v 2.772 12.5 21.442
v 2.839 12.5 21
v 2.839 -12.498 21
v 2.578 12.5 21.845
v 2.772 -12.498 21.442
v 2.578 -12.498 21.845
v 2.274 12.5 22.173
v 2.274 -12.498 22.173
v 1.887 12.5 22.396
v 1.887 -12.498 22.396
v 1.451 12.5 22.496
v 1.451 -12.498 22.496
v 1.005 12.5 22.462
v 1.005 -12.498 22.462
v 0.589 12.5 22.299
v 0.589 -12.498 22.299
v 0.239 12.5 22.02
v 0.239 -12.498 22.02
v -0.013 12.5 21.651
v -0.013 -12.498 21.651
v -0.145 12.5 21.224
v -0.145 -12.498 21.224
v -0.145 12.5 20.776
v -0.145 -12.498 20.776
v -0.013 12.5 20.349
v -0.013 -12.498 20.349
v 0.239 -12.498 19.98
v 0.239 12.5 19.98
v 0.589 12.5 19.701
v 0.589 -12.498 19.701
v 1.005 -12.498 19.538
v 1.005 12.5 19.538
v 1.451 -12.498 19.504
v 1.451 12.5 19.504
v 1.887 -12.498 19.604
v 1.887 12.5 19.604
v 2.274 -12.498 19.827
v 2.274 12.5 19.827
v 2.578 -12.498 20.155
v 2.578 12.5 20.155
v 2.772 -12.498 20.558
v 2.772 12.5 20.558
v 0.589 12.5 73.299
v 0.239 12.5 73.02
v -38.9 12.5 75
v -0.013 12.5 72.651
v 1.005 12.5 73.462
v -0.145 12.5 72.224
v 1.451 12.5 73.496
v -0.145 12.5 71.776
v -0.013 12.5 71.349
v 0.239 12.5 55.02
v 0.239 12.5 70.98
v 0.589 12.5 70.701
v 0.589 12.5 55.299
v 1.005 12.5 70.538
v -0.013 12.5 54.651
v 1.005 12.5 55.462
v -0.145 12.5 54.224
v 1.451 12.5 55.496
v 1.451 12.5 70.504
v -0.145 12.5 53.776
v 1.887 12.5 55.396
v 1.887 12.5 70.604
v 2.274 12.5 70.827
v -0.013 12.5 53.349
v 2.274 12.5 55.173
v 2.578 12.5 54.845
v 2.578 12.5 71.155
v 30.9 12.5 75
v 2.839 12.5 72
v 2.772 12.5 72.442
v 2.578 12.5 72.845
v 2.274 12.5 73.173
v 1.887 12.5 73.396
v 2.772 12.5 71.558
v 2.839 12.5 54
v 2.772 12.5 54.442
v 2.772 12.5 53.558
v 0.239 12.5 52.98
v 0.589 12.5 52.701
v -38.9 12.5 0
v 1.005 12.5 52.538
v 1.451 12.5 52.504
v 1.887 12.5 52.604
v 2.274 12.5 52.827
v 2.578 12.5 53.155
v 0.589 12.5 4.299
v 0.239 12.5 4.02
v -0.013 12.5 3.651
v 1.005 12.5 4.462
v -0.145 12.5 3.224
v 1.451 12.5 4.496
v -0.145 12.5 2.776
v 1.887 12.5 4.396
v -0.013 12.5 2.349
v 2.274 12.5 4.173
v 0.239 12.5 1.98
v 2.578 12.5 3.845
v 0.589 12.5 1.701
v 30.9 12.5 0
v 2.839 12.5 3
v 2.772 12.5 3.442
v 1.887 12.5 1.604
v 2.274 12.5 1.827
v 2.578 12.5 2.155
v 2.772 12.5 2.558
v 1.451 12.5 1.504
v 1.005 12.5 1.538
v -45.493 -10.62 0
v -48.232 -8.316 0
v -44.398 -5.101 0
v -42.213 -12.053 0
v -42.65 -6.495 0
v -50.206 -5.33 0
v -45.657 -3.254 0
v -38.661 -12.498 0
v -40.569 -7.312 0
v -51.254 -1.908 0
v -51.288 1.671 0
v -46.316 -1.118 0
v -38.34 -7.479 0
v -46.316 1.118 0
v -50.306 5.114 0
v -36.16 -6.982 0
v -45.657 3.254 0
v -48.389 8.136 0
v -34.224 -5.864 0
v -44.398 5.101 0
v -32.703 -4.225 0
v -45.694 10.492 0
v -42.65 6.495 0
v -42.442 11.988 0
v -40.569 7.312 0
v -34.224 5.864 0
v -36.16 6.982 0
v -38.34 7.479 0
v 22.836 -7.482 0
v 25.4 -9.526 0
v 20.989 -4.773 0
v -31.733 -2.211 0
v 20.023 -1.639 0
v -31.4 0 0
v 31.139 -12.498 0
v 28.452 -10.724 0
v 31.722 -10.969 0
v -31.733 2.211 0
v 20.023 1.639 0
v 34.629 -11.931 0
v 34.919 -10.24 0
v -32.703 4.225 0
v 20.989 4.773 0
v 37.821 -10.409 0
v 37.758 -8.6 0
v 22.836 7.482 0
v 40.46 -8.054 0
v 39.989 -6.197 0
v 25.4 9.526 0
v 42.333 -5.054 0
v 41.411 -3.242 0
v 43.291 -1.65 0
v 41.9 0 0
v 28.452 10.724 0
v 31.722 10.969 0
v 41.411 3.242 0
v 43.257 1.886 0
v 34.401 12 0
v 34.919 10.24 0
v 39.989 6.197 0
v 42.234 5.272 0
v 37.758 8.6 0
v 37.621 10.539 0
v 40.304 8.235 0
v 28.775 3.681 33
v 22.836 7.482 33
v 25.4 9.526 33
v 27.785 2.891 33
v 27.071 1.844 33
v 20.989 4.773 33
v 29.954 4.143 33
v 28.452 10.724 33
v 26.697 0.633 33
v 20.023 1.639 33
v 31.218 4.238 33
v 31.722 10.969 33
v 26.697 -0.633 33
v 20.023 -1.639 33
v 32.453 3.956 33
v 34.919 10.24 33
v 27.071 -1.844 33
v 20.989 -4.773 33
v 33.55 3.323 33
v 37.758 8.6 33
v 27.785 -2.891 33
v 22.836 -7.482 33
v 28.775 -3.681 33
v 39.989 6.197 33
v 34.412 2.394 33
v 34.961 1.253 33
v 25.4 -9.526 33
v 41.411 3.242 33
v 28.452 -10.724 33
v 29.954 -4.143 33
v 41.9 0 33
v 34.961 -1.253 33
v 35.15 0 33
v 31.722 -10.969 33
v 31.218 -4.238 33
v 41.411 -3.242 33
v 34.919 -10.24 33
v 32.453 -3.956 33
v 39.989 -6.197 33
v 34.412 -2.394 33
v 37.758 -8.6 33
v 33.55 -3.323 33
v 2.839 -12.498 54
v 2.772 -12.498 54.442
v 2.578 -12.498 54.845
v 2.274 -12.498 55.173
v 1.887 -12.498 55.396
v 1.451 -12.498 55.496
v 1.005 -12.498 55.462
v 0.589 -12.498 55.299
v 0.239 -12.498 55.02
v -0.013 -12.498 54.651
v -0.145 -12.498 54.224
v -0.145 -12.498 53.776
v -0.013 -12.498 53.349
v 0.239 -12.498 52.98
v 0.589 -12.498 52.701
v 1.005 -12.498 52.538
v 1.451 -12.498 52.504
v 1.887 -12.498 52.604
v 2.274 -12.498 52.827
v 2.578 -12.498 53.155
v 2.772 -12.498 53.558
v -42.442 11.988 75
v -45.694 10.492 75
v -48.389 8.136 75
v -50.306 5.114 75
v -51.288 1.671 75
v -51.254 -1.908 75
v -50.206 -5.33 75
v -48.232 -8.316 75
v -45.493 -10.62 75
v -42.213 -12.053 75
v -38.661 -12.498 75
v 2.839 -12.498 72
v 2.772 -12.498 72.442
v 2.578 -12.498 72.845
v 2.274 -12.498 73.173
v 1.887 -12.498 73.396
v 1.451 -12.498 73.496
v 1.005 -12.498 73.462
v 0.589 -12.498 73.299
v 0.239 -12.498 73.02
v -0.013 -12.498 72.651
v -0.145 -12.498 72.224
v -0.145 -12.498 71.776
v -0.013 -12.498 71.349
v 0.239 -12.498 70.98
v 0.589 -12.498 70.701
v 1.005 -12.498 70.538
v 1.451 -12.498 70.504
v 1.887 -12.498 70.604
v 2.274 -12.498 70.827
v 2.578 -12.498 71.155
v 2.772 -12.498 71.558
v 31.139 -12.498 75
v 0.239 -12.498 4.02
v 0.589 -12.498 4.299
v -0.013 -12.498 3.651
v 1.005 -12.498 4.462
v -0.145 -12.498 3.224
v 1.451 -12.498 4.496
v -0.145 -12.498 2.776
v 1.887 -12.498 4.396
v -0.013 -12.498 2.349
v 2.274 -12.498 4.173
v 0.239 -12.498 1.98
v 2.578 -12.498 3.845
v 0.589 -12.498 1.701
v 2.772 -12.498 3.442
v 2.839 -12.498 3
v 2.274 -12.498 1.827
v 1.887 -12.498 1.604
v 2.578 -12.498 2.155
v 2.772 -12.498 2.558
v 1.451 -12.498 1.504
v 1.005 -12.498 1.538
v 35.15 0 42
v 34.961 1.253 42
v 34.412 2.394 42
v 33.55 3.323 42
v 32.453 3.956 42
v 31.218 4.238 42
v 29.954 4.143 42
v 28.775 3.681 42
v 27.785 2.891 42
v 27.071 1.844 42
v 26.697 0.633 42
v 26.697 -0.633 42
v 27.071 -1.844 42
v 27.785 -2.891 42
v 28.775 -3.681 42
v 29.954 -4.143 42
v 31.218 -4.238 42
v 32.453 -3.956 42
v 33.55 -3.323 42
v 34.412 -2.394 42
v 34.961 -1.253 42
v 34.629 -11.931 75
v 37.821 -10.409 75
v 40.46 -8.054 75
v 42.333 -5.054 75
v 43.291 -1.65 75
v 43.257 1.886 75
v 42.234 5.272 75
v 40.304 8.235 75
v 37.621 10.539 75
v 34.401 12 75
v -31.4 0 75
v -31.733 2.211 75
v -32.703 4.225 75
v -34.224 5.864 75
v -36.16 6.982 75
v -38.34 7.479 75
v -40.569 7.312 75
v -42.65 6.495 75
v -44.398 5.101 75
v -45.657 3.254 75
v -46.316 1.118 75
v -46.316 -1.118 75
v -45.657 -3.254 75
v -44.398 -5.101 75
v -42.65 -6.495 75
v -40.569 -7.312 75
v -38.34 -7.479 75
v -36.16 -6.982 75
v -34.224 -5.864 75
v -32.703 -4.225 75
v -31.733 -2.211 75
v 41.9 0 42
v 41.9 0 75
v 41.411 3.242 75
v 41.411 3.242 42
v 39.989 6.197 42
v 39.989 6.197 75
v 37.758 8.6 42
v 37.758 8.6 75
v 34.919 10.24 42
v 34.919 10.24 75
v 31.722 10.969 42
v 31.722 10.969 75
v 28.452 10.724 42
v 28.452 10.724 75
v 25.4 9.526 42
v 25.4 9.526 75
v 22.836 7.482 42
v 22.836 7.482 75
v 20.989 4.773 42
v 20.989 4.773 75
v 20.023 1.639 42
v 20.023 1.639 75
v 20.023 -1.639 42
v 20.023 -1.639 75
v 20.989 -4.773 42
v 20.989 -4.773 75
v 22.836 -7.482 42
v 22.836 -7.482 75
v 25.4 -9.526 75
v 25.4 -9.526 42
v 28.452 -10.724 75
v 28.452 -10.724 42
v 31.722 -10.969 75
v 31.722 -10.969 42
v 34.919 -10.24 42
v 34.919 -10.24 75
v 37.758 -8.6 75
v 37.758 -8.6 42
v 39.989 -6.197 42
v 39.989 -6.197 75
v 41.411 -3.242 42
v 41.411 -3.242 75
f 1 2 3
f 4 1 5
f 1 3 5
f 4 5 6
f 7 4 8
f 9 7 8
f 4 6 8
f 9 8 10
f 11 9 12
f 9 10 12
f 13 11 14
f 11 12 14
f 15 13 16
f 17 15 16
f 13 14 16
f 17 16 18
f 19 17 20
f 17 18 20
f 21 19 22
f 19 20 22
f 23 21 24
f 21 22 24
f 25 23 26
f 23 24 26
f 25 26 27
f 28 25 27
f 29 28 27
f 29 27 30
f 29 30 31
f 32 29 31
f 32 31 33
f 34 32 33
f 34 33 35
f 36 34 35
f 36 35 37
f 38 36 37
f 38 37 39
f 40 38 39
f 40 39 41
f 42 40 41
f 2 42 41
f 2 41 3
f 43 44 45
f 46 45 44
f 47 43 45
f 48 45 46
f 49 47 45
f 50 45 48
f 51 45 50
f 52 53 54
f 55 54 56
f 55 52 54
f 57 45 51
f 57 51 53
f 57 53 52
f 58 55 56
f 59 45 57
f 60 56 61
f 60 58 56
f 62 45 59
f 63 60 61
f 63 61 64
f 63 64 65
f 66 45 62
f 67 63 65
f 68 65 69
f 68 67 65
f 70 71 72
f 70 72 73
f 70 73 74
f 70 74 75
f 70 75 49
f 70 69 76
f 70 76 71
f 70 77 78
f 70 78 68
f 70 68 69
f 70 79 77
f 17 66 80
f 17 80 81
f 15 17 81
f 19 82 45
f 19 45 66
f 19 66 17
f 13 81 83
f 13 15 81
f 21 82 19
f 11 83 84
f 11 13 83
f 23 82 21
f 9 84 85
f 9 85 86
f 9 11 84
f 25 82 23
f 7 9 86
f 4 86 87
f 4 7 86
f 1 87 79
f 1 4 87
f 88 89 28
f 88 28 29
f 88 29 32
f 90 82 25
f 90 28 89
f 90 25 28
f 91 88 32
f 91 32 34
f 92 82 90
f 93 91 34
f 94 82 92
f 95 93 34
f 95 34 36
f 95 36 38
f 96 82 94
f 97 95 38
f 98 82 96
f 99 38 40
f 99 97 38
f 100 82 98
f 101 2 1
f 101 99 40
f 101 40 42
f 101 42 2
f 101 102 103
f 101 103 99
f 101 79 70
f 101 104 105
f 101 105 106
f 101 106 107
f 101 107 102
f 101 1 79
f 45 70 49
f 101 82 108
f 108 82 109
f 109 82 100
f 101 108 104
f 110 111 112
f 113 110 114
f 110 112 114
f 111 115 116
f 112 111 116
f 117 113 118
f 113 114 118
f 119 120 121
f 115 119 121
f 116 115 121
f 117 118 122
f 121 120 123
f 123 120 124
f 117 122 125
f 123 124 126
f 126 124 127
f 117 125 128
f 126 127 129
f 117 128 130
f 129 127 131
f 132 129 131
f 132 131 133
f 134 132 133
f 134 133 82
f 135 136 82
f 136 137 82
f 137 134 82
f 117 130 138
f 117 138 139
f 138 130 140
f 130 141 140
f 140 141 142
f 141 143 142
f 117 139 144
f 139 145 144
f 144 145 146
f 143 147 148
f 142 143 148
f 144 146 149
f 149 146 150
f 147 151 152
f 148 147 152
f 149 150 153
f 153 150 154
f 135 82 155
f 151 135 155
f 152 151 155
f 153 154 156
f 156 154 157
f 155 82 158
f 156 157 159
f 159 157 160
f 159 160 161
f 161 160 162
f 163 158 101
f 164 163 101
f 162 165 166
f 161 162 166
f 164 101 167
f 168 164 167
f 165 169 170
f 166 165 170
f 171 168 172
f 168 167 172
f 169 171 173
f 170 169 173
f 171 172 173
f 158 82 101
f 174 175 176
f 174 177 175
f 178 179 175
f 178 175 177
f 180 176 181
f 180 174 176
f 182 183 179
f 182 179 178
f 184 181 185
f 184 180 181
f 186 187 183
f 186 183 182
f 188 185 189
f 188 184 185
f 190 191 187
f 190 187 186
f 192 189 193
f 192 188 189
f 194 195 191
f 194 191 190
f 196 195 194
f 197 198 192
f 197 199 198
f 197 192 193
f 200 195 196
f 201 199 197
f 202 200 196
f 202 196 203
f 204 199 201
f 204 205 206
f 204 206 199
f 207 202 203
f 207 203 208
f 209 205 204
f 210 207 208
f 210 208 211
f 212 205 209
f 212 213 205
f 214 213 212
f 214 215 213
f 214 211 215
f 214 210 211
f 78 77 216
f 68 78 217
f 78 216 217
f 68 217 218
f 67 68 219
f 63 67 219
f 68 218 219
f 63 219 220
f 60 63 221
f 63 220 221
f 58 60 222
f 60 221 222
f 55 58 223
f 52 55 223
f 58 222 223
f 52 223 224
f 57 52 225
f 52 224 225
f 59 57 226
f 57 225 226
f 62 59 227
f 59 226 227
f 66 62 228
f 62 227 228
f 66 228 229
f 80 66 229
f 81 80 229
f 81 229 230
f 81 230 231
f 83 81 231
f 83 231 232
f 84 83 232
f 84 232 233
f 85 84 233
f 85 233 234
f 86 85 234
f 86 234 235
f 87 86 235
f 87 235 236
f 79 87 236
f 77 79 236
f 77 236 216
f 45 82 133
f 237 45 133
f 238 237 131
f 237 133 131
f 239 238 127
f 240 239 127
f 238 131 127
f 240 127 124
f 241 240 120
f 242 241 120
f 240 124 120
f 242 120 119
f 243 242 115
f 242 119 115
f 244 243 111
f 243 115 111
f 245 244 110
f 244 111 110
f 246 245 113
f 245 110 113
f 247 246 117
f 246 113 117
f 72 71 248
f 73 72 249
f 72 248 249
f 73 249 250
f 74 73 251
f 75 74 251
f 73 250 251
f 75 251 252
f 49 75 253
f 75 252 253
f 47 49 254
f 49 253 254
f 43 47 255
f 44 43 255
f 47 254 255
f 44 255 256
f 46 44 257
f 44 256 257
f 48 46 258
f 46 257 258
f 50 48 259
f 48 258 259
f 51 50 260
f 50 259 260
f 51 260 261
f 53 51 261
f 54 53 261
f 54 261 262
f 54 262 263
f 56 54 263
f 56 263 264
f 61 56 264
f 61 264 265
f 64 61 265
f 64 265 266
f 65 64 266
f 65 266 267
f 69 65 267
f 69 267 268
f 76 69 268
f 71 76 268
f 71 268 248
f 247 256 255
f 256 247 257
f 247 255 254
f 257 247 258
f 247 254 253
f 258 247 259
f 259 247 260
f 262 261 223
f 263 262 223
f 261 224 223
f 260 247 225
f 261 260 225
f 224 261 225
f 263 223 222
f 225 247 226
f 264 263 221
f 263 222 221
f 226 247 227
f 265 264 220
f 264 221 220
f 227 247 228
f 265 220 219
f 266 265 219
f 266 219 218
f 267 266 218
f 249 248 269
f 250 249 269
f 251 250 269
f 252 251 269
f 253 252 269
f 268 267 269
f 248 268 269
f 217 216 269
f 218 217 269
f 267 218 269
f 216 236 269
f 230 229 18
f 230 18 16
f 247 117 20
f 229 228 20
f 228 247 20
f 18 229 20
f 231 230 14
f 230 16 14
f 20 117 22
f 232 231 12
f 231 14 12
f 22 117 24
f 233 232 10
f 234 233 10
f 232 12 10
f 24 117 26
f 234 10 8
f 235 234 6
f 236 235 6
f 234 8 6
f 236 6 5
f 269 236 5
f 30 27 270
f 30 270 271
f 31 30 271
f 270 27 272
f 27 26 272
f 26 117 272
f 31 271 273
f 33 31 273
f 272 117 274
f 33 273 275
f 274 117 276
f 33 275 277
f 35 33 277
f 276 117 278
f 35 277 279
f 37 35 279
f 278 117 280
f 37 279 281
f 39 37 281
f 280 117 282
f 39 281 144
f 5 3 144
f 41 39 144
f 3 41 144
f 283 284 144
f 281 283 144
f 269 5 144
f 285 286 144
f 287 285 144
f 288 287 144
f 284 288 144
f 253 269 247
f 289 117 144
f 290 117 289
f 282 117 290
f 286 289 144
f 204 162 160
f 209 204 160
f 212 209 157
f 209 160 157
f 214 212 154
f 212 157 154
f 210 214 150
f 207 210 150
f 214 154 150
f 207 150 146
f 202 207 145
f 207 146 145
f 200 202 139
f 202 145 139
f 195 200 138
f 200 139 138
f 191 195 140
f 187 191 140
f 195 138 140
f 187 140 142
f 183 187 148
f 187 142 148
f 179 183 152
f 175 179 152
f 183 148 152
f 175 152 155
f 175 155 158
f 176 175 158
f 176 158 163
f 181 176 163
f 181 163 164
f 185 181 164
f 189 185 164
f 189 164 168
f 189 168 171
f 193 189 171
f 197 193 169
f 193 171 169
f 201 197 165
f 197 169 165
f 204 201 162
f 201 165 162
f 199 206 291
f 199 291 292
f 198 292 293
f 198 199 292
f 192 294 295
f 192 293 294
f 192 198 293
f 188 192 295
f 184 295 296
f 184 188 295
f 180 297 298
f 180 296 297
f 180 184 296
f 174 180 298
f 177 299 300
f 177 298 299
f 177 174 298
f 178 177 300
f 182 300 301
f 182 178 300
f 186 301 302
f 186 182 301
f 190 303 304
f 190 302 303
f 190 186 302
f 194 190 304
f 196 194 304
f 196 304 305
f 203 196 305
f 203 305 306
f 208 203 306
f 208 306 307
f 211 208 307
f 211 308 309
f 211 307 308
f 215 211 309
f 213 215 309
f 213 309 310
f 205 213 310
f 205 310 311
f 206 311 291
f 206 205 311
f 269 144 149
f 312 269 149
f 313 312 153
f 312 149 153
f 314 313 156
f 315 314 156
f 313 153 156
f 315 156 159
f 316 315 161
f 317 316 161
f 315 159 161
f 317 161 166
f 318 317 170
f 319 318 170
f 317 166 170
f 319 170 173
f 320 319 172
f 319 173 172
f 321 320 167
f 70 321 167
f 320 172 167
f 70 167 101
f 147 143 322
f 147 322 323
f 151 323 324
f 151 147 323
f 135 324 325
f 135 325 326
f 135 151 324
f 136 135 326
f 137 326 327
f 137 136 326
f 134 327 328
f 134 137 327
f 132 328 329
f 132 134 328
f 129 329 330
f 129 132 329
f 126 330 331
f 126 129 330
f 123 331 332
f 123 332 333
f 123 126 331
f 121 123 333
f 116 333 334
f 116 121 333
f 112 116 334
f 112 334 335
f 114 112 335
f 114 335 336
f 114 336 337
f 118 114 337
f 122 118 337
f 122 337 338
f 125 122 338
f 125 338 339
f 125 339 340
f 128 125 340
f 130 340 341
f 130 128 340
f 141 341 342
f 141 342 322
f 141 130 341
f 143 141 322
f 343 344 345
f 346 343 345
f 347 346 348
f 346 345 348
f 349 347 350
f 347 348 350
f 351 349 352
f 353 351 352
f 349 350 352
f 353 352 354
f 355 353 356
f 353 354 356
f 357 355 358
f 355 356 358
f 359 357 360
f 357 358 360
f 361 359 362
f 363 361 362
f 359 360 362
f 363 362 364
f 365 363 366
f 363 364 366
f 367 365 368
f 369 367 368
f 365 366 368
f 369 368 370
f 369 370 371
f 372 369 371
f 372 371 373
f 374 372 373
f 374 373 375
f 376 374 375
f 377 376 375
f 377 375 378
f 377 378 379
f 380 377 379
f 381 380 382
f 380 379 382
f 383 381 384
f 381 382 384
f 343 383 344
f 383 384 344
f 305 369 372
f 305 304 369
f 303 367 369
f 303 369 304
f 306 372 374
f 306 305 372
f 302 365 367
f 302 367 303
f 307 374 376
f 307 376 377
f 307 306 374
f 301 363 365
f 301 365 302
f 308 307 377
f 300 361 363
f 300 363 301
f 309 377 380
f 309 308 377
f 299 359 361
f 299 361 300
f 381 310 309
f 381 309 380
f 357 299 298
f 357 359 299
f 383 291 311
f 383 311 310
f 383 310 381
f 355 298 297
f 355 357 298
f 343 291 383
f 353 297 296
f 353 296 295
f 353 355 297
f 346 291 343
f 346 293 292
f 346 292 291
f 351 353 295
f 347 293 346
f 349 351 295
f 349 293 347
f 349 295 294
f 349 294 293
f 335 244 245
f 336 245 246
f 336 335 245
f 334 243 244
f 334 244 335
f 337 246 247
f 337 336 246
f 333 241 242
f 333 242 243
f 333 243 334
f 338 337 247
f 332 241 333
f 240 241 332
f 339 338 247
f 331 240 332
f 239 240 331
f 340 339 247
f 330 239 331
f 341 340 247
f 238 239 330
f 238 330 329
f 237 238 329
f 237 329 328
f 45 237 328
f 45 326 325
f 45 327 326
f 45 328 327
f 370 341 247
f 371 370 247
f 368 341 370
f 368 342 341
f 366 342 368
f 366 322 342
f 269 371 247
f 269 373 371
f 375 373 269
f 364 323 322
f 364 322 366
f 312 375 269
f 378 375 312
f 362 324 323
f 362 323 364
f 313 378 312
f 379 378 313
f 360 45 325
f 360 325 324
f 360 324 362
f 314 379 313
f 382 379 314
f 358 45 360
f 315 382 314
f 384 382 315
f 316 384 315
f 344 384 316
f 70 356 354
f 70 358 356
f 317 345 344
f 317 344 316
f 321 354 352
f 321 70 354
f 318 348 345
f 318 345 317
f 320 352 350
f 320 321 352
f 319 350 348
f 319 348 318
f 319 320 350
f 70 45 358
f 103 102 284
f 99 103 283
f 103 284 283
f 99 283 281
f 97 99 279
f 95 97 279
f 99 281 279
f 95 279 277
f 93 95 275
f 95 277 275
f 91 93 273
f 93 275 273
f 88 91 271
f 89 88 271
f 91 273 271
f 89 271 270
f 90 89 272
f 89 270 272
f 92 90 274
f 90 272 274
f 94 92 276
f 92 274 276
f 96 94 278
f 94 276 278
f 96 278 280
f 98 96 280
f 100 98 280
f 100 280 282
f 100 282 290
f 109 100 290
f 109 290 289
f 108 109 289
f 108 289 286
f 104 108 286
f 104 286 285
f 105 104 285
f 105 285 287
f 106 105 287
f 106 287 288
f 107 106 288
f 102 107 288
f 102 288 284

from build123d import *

# Parameters (mm, degrees)
SKETCH_R        = 7.5
SKETCH_R_2      = 4.25
PAD_DEPTH       = 75
SKETCH004_R     = 1.5
HOLE001_DEPTH   = 25
HOLE001_TIPS_R  = 1.5
SKETCH005_R     = 11
POCKET002_DEPTH = 33
SKETCH006_R     = 11
POCKET003_DEPTH = 33


with BuildPart() as part:
    # Sketch → Pad (new body)
    with BuildSketch(Plane.XY):
        with BuildLine():
            ThreePointArc((-38.9, 12.5), (-51.39943, -0.119353), (-38.661306, -12.497721))
            Line((-38.661306, -12.497721), (31.138694, -12.497721))
            ThreePointArc((31.138694, -12.497721), (43.39943, 0.119353), (30.9, 12.5))
            Line((-38.9, 12.5), (30.9, 12.5))
        make_face()
        with Locations((-38.9, 0)):
            Circle(SKETCH_R, mode=Mode.SUBTRACT)
        with Locations((30.9, 0)):
            Circle(SKETCH_R_2, mode=Mode.SUBTRACT)
    extrude(amount=PAD_DEPTH)

    # Sketch004 → Hole001 (cut)
    with BuildSketch(Plane.XZ.offset(12.5)):
        with Locations((1.338694, 72)):
            Circle(SKETCH004_R)
        with Locations((1.338694, 54)):
            Circle(SKETCH004_R)
        with Locations((1.338694, 21)):
            Circle(SKETCH004_R)
        with Locations((1.338694, 3)):
            Circle(SKETCH004_R)
    extrude(amount=-HOLE001_DEPTH, mode=Mode.SUBTRACT)

    # Hole001 tips → Hole001 tip 1 section 0
    with BuildSketch(Plane.XZ.offset(-12.5), mode=Mode.PRIVATE) as hole001_tip_1_s0:
        with Locations((1.338694, 72)):
            Circle(HOLE001_TIPS_R)
    loft([hole001_tip_1_s0.sketch, Vertex(1.338694, 13.401291, 72)], mode=Mode.SUBTRACT)

    # Hole001 tips → Hole001 tip 2 section 0
    with BuildSketch(Plane.XZ.offset(-12.5), mode=Mode.PRIVATE) as hole001_tip_2_s0:
        with Locations((1.338694, 54)):
            Circle(HOLE001_TIPS_R)
    loft([hole001_tip_2_s0.sketch, Vertex(1.338694, 13.401291, 54)], mode=Mode.SUBTRACT)

    # Hole001 tips → Hole001 tip 3 section 0
    with BuildSketch(Plane.XZ.offset(-12.5), mode=Mode.PRIVATE) as hole001_tip_3_s0:
        with Locations((1.338694, 21)):
            Circle(HOLE001_TIPS_R)
    loft([hole001_tip_3_s0.sketch, Vertex(1.338694, 13.401291, 21)], mode=Mode.SUBTRACT)

    # Hole001 tips → Hole001 tip 4 section 0
    with BuildSketch(Plane.XZ.offset(-12.5), mode=Mode.PRIVATE) as hole001_tip_4_s0:
        with Locations((1.338694, 3)):
            Circle(HOLE001_TIPS_R)
    loft([hole001_tip_4_s0.sketch, Vertex(1.338694, 13.401291, 3)], mode=Mode.SUBTRACT)

    # Sketch005 (on Face5 of Hole001) → Pocket002 (cut)
    with BuildSketch(Plane.XY.offset(75)):
        with Locations((30.9, 0)):
            Circle(SKETCH005_R)
    extrude(amount=-POCKET002_DEPTH, mode=Mode.SUBTRACT)

    # Sketch006 (on Face4 of Pocket002) → Pocket003 (cut)
    with BuildSketch(Plane(origin=(0, 0, 0), x_dir=(1, 0, 0), z_dir=(0, 0, -1))):
        with Locations((30.9, 0)):
            Circle(SKETCH006_R)
    extrude(amount=-POCKET003_DEPTH, mode=Mode.SUBTRACT)


solid = part.part
